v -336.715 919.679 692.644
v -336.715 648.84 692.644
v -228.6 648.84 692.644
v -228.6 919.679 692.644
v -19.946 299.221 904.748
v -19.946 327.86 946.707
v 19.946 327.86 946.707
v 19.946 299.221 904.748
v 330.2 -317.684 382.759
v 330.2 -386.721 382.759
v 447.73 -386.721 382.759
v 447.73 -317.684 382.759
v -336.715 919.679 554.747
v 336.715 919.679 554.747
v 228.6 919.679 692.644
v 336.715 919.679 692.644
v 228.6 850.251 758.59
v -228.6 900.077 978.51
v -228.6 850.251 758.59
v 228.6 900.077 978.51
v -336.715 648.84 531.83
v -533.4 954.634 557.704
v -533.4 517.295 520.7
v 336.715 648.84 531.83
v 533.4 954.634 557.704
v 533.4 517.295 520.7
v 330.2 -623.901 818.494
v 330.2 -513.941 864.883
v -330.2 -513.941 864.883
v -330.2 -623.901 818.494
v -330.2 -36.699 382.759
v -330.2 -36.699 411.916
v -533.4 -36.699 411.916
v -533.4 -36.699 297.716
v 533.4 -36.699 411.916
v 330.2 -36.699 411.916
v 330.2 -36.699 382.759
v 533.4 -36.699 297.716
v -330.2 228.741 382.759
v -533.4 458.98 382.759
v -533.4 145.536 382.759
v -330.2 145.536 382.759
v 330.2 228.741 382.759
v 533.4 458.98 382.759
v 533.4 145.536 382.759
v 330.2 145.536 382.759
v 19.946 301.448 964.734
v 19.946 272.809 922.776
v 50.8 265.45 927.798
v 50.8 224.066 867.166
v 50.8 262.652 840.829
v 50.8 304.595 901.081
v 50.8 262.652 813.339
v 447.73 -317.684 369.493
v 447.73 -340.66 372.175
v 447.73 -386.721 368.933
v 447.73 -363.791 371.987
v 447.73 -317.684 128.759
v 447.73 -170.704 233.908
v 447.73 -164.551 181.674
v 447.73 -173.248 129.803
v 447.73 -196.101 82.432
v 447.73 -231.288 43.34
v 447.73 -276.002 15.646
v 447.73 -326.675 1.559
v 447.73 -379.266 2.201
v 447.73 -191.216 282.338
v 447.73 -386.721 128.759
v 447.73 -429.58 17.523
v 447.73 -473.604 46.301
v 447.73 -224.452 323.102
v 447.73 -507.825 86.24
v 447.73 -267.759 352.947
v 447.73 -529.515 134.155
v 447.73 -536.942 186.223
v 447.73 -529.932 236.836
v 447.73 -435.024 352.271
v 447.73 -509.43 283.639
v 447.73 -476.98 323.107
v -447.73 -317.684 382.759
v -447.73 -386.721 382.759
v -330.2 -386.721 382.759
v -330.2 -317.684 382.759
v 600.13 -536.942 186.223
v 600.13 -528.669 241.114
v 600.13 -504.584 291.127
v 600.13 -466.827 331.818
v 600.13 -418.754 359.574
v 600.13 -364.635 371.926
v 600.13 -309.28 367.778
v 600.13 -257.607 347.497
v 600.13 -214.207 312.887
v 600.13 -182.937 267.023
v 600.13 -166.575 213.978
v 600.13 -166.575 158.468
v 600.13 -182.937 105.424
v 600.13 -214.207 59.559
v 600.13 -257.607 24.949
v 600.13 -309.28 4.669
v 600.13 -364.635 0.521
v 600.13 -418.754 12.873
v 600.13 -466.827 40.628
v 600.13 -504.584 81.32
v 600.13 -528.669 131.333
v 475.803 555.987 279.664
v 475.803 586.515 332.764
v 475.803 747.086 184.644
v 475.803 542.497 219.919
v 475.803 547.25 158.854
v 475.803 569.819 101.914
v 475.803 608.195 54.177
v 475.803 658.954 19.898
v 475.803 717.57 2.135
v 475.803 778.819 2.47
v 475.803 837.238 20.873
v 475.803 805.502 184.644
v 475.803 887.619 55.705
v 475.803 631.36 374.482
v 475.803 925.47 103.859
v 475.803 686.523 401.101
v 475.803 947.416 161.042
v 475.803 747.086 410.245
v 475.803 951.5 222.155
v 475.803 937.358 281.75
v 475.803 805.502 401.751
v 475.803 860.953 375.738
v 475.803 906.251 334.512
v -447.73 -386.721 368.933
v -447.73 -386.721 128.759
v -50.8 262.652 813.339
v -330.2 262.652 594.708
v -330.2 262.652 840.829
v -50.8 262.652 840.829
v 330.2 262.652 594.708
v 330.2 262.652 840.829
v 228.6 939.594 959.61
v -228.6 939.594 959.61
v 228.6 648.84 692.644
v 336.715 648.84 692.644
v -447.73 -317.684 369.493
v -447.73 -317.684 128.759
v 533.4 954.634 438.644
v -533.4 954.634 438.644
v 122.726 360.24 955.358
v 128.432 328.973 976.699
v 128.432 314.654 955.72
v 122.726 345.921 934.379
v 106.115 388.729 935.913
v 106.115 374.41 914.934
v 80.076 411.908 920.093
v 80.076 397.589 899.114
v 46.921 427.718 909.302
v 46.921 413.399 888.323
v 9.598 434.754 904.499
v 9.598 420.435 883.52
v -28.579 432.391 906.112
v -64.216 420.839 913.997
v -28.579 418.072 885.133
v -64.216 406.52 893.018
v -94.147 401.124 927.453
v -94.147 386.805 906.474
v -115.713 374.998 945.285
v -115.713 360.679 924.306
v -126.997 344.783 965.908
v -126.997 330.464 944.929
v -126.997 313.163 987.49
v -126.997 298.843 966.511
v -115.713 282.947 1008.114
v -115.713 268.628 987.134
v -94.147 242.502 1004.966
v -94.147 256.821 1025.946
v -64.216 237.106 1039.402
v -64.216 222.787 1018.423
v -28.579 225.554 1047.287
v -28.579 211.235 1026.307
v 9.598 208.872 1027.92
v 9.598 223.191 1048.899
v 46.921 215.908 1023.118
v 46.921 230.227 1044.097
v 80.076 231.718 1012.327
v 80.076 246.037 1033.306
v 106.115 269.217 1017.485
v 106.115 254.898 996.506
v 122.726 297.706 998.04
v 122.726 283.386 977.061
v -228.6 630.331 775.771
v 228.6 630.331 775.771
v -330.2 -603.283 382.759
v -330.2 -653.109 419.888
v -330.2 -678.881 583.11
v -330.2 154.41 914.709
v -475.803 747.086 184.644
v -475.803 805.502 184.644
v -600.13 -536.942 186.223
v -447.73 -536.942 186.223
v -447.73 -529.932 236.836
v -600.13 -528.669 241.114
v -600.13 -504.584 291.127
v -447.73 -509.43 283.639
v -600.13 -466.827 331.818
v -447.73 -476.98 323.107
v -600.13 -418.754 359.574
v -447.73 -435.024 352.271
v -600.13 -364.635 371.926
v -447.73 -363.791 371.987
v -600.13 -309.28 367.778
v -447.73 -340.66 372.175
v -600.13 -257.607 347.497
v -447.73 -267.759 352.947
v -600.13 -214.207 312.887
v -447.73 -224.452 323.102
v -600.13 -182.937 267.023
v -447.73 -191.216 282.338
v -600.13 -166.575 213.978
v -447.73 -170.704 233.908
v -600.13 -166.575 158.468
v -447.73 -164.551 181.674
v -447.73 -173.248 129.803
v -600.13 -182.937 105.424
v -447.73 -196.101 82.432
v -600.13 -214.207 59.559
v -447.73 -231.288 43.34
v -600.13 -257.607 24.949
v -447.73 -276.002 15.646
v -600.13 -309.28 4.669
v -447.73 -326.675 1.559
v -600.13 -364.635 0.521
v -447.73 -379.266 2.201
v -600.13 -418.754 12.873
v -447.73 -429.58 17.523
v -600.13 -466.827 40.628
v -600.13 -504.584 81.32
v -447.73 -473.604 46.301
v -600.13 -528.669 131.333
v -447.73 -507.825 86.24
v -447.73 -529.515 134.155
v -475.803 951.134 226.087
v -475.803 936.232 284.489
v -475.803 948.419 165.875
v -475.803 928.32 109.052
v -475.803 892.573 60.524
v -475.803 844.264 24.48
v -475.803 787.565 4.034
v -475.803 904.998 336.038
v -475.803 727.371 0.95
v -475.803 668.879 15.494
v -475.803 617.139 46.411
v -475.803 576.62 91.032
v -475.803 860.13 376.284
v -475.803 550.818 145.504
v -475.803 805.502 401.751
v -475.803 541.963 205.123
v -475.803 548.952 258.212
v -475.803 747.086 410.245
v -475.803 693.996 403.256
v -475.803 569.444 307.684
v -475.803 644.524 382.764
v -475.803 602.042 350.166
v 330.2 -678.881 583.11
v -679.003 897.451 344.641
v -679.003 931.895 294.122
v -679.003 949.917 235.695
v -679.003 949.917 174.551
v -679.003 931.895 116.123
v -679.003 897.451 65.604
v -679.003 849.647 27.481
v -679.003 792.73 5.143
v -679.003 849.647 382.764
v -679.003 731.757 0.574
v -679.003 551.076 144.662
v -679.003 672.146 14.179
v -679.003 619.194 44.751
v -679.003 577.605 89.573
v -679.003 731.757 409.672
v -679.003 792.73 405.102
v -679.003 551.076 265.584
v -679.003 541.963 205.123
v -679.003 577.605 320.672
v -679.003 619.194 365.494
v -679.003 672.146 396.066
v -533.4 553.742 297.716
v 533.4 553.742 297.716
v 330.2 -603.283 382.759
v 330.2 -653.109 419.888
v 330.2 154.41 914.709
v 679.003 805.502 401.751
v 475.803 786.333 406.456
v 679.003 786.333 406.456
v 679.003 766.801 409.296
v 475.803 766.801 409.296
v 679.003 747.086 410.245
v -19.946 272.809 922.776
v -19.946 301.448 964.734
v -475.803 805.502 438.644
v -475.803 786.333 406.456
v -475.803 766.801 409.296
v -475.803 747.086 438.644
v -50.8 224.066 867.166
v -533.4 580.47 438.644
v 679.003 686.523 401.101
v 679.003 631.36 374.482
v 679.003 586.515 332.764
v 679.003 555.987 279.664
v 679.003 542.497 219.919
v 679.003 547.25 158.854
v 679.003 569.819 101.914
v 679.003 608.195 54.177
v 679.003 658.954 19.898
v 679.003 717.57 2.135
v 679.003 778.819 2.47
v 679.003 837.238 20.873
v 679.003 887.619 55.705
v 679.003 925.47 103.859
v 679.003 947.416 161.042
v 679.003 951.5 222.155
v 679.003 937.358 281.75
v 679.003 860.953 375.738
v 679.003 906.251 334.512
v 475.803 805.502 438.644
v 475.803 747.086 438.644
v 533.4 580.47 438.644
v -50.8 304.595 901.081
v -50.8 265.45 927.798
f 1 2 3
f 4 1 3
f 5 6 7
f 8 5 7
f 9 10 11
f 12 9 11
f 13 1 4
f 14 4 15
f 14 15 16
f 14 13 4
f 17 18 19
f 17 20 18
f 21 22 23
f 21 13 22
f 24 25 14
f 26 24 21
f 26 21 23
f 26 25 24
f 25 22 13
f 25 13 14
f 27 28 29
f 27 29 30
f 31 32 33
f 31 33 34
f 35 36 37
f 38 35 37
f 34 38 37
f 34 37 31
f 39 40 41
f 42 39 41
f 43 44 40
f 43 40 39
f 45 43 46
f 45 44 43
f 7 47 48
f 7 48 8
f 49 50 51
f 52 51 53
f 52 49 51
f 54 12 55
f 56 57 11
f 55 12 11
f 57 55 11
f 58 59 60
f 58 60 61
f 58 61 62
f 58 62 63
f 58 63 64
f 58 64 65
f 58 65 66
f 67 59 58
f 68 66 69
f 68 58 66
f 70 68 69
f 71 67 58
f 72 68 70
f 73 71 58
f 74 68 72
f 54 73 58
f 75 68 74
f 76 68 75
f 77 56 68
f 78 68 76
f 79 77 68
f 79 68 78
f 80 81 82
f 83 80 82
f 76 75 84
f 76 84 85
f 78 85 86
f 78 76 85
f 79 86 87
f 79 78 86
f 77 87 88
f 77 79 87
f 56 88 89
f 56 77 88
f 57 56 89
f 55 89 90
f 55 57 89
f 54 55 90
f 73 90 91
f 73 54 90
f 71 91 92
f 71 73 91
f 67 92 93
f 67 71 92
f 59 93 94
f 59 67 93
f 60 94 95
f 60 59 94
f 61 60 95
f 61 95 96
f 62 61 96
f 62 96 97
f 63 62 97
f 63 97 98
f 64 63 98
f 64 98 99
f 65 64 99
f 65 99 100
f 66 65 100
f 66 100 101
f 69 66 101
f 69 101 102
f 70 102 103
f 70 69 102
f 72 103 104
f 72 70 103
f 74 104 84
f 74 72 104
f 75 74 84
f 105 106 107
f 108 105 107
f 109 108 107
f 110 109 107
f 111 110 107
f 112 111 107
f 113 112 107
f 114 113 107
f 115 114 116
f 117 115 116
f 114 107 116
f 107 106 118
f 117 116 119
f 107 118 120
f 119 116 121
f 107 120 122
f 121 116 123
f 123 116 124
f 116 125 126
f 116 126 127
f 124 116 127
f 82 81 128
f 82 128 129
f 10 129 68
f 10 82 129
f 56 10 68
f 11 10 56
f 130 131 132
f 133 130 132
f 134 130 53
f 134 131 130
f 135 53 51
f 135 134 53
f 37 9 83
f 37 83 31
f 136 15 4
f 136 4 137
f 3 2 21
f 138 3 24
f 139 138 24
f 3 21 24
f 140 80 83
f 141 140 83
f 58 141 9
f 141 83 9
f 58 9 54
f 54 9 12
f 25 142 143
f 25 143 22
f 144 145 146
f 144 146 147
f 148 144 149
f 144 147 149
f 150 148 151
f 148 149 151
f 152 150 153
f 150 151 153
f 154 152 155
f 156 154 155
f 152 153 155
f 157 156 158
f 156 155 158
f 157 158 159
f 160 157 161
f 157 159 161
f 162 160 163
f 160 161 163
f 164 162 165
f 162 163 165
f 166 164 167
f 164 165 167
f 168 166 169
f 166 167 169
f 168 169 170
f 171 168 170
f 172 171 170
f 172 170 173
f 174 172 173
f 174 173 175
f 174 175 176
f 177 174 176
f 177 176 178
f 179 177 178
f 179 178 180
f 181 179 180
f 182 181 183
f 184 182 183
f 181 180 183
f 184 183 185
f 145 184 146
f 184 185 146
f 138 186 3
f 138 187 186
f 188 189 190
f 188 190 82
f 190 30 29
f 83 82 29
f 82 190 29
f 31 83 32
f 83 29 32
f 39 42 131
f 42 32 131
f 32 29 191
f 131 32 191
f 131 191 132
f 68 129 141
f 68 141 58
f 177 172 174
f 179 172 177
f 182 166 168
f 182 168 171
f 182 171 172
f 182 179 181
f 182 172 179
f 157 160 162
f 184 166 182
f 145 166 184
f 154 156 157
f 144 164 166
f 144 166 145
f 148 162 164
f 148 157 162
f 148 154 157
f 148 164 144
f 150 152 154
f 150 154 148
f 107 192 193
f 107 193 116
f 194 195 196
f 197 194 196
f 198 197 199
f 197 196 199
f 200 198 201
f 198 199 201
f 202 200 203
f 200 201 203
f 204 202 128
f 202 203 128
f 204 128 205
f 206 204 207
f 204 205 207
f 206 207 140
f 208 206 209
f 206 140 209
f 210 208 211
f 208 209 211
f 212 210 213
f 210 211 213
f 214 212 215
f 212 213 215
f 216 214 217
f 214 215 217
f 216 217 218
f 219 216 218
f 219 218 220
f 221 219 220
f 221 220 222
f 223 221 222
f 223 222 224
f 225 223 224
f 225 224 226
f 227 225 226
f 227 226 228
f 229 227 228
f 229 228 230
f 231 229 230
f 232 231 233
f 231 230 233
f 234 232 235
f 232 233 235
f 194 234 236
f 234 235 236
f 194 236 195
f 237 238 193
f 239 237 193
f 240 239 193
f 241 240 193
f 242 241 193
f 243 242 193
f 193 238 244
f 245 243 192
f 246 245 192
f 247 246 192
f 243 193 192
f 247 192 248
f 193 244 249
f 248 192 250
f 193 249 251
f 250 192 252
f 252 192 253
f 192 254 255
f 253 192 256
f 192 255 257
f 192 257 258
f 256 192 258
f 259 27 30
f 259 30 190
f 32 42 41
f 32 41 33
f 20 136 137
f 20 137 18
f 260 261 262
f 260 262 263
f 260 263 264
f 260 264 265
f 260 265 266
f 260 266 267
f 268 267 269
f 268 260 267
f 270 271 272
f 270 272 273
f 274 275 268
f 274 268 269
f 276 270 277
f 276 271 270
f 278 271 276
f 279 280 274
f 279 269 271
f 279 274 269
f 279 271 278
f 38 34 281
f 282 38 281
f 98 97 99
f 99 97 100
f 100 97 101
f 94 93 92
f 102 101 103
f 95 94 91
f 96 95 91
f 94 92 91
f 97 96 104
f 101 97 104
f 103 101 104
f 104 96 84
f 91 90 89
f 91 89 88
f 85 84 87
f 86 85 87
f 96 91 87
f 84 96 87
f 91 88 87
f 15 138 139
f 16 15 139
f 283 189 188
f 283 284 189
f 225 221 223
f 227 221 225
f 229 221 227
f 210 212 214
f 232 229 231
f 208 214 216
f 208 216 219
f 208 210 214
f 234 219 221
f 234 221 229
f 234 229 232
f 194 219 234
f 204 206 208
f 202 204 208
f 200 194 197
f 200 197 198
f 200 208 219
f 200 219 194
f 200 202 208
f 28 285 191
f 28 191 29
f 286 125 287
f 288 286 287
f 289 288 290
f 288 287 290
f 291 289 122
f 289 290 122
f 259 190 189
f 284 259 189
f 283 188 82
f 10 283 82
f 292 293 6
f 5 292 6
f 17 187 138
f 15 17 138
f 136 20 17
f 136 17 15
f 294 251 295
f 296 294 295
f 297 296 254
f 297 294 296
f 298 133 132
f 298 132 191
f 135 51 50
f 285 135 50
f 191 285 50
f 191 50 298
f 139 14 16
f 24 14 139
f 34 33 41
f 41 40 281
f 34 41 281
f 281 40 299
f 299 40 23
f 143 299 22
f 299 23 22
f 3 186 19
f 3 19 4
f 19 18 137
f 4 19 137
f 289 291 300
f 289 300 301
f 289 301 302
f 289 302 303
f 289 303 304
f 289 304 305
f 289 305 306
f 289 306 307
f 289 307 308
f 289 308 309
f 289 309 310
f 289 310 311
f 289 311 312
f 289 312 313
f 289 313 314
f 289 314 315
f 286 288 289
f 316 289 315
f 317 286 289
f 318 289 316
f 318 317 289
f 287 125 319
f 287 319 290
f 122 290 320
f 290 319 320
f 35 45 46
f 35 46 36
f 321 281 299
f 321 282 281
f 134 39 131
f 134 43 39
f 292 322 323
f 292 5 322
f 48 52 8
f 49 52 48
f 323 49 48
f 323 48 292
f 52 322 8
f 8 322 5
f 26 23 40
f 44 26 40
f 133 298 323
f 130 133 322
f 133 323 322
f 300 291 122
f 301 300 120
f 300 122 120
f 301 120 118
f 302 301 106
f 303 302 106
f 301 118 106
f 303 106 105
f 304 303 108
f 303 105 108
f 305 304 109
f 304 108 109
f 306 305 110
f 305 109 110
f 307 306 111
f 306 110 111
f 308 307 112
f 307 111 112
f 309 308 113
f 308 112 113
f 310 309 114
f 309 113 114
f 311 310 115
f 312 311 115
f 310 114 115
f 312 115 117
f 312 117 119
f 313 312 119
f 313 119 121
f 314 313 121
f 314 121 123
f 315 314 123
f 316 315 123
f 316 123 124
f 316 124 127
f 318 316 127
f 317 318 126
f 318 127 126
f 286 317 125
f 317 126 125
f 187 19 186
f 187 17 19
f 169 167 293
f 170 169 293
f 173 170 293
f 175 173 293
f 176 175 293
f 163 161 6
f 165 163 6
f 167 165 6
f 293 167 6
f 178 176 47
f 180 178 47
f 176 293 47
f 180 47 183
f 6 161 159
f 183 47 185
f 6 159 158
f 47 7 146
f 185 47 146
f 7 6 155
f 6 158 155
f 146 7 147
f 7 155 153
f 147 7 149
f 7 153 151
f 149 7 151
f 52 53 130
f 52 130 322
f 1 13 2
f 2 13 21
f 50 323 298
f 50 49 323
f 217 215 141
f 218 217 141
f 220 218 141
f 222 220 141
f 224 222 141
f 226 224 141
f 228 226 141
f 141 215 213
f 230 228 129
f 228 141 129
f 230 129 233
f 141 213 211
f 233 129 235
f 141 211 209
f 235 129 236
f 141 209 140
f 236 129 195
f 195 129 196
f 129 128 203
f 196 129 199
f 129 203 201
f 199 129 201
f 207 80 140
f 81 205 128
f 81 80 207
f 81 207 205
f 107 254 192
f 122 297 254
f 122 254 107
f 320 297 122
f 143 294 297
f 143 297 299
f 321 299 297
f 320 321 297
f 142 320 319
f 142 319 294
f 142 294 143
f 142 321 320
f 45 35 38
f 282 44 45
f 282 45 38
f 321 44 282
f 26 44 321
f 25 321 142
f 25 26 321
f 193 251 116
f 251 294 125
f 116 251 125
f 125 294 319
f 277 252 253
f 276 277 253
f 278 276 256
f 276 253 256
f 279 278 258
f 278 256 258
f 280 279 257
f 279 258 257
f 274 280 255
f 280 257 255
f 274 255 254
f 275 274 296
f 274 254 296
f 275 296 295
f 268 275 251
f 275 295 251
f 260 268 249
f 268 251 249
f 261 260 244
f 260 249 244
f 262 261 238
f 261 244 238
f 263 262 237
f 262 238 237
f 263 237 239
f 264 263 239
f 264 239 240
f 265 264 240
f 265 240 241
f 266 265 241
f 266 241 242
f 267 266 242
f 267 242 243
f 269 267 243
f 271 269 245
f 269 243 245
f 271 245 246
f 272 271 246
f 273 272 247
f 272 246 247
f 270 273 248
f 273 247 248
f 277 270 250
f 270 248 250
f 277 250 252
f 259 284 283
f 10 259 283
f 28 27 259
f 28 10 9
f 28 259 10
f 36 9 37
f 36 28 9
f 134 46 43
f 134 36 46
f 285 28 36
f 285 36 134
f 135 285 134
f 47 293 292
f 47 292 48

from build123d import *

# Parameters (mm, degrees)
F3_DEPTH  = 533.4
F5_DEPTH  = 330.2
F6_W      = 895.4597115517
F6_H      = 69.037437439
F7_DEPTH  = 254
F9_DEPTH  = 152.4
F11_W     = 951.6055583954
F11_H     = 58.4162473679
F12_DEPTH = 254
F13_R     = 205.1226496696
F14_DEPTH = 203.2
F16_DEPTH = 203.2
F17_W     = 673.4294295311
F17_H     = 270.8390951157
F18_DEPTH = 254
F20_DEPTH = 228.6
F22_DEPTH = 50.8
F23_W     = 39.8923233151
F23_H     = 31.9777131081
F24_DEPTH = 50.8
F25_R     = 128.4316644383
F26_DEPTH = 25.4


with BuildPart() as f3:
    # F2 (on face) → F3 (new body, symmetric)
    with BuildSketch(Plane.YZ):
        Polygon((580.4695487022, 438.6440515518), (954.6338915825, 438.6440515518), (954.6338915825, 557.7040910721), (517.2948241234, 520.7), (458.9797258377, 382.7587366104), (145.5359309912, 382.7587366104), (-36.6988368332, 411.9162857533), (-36.6988368332, 297.7158427238), (553.741812706, 297.7158427238), align=None)
    extrude(amount=F3_DEPTH, both=True)

    # F4 (on face) → F5 (join, symmetric)
    with BuildSketch(Plane.YZ):
        Polygon((145.5359309912, 382.7587366104), (228.7405356924, 382.7587366104), (262.6523375511, 594.7075978799), (262.6523375511, 840.8291935921), (154.4104069471, 914.7086143494), (-513.9405727386, 864.883005619), (-623.9005923271, 818.4935450554), (-678.880572319, 583.110332489), (-653.1087756157, 419.8883771896), (-603.2831072807, 382.7587366104), align=None)
    extrude(amount=F5_DEPTH, both=True)

    # F6 (on face) → F7 (join)
    with BuildSketch(Plane(origin=(0, 0, 382.7587366104), x_dir=(1, 0, 0), z_dir=(0, 0, -1))):
        with Locations((0, 352.2024452686)):
            Rectangle(F6_W, F6_H)
    extrude(amount=F7_DEPTH)

    # F8 (on face) → F9 (join)
    with BuildSketch(Plane(origin=(-447.7298557758, 0, 0), x_dir=(0, -1, 0), z_dir=(-1, 0, 0))):
        with BuildLine():
            ThreePointArc((350.7186164637, 0), (482.3983530717, 54.5435321866), (536.9418859482, 186.2232685089))
            ThreePointArc((536.9418859482, 186.2232685089), (219.0388818068, 317.9030048312), (350.7186164637, 0))
        make_face()
    extrude(amount=F9_DEPTH)

    # F10: F3 across face


with BuildPart() as f3_1:
    add(f3.part)
    add(f3.part.mirror(Plane.YZ))

    # F11 (on face) → F12 (join)
    with BuildSketch(Plane(origin=(0, 0, 438.6440515518), x_dir=(1, 0, 0), z_dir=(0, 0, -1))):
        with Locations((0, -776.2938737869)):
            Rectangle(F11_W, F11_H)
    extrude(amount=F12_DEPTH)

    # F13 (on face) → F14 (join)
    with BuildSketch(Plane(origin=(-475.8027791977, 0, 0), x_dir=(0, -1, 0), z_dir=(-1, 0, 0))):
        with Locations((-747.085750103, 205.1226496696)):
            Circle(F13_R)
    extrude(amount=F14_DEPTH)

    # F15 (on face) → F16 (join)
    with BuildSketch(Plane.YZ.offset(475.8027791977)):
        with BuildLine():
            ThreePointArc((747.085750103, 410.2452993393), (602.0421335466, 60.0790331133), (952.2083997726, 205.1226496696))
            ThreePointArc((952.2083997726, 205.1226496696), (911.4904289466, 327.7864299058), (805.5019974709, 401.751344043))
            ThreePointArc((805.5019974709, 401.751344043), (776.6010225612, 408.1107037497), (747.085750103, 410.2452993393))
        make_face()
    extrude(amount=F16_DEPTH)

    # F17 (on face) → F18 (join)
    with BuildSketch(Plane(origin=(0, 0, 438.6440515518), x_dir=(1, 0, 0), z_dir=(0, 0, -1))):
        with Locations((0, -784.2597365379)):
            Rectangle(F17_W, F17_H)
    extrude(amount=-F18_DEPTH)

    # F19 (on face) → F20 (join, symmetric)
    with BuildSketch(Plane.YZ):
        Polygon((630.3312778473, 775.7710305214), (648.8401889801, 692.6440515518), (919.6792840958, 692.6440515518), (939.593911171, 959.6104708672), (900.0770449638, 978.5098520279), (850.2513766289, 758.5897532463), align=None)
    extrude(amount=F20_DEPTH, both=True)

    # F21 (on face) → F22 (join, symmetric)
    with BuildSketch(Plane.YZ):
        Polygon((224.0662593073, 867.1657259695), (262.6523375511, 840.8291935921), (262.6523375511, 813.3391737938), (304.5946338236, 901.0808301074), (265.4504130698, 927.7983169367), align=None)
    extrude(amount=F22_DEPTH, both=True)

    # F23 (on face) → F24 (join)
    with BuildSketch(Plane(origin=(0, 516.3670714777, 756.5377224693), x_dir=(1, 0, 0), z_dir=(0, 0.5637436051, 0.8259498458))):
        with Locations((0, -278.8930535316)):
            Rectangle(F23_W, F23_H)
    extrude(amount=F24_DEPTH)

    # F25 (on face) → F26 (join)
    with BuildSketch(Plane(origin=(0, 545.005246616, 798.4959746344), x_dir=(1, 0, 0), z_dir=(0, 0.5637436051, 0.8259498458))):
        with Locations((0, -278.8930535316)):
            Circle(F25_R)
    extrude(amount=F26_DEPTH)


solid = f3_1.part
